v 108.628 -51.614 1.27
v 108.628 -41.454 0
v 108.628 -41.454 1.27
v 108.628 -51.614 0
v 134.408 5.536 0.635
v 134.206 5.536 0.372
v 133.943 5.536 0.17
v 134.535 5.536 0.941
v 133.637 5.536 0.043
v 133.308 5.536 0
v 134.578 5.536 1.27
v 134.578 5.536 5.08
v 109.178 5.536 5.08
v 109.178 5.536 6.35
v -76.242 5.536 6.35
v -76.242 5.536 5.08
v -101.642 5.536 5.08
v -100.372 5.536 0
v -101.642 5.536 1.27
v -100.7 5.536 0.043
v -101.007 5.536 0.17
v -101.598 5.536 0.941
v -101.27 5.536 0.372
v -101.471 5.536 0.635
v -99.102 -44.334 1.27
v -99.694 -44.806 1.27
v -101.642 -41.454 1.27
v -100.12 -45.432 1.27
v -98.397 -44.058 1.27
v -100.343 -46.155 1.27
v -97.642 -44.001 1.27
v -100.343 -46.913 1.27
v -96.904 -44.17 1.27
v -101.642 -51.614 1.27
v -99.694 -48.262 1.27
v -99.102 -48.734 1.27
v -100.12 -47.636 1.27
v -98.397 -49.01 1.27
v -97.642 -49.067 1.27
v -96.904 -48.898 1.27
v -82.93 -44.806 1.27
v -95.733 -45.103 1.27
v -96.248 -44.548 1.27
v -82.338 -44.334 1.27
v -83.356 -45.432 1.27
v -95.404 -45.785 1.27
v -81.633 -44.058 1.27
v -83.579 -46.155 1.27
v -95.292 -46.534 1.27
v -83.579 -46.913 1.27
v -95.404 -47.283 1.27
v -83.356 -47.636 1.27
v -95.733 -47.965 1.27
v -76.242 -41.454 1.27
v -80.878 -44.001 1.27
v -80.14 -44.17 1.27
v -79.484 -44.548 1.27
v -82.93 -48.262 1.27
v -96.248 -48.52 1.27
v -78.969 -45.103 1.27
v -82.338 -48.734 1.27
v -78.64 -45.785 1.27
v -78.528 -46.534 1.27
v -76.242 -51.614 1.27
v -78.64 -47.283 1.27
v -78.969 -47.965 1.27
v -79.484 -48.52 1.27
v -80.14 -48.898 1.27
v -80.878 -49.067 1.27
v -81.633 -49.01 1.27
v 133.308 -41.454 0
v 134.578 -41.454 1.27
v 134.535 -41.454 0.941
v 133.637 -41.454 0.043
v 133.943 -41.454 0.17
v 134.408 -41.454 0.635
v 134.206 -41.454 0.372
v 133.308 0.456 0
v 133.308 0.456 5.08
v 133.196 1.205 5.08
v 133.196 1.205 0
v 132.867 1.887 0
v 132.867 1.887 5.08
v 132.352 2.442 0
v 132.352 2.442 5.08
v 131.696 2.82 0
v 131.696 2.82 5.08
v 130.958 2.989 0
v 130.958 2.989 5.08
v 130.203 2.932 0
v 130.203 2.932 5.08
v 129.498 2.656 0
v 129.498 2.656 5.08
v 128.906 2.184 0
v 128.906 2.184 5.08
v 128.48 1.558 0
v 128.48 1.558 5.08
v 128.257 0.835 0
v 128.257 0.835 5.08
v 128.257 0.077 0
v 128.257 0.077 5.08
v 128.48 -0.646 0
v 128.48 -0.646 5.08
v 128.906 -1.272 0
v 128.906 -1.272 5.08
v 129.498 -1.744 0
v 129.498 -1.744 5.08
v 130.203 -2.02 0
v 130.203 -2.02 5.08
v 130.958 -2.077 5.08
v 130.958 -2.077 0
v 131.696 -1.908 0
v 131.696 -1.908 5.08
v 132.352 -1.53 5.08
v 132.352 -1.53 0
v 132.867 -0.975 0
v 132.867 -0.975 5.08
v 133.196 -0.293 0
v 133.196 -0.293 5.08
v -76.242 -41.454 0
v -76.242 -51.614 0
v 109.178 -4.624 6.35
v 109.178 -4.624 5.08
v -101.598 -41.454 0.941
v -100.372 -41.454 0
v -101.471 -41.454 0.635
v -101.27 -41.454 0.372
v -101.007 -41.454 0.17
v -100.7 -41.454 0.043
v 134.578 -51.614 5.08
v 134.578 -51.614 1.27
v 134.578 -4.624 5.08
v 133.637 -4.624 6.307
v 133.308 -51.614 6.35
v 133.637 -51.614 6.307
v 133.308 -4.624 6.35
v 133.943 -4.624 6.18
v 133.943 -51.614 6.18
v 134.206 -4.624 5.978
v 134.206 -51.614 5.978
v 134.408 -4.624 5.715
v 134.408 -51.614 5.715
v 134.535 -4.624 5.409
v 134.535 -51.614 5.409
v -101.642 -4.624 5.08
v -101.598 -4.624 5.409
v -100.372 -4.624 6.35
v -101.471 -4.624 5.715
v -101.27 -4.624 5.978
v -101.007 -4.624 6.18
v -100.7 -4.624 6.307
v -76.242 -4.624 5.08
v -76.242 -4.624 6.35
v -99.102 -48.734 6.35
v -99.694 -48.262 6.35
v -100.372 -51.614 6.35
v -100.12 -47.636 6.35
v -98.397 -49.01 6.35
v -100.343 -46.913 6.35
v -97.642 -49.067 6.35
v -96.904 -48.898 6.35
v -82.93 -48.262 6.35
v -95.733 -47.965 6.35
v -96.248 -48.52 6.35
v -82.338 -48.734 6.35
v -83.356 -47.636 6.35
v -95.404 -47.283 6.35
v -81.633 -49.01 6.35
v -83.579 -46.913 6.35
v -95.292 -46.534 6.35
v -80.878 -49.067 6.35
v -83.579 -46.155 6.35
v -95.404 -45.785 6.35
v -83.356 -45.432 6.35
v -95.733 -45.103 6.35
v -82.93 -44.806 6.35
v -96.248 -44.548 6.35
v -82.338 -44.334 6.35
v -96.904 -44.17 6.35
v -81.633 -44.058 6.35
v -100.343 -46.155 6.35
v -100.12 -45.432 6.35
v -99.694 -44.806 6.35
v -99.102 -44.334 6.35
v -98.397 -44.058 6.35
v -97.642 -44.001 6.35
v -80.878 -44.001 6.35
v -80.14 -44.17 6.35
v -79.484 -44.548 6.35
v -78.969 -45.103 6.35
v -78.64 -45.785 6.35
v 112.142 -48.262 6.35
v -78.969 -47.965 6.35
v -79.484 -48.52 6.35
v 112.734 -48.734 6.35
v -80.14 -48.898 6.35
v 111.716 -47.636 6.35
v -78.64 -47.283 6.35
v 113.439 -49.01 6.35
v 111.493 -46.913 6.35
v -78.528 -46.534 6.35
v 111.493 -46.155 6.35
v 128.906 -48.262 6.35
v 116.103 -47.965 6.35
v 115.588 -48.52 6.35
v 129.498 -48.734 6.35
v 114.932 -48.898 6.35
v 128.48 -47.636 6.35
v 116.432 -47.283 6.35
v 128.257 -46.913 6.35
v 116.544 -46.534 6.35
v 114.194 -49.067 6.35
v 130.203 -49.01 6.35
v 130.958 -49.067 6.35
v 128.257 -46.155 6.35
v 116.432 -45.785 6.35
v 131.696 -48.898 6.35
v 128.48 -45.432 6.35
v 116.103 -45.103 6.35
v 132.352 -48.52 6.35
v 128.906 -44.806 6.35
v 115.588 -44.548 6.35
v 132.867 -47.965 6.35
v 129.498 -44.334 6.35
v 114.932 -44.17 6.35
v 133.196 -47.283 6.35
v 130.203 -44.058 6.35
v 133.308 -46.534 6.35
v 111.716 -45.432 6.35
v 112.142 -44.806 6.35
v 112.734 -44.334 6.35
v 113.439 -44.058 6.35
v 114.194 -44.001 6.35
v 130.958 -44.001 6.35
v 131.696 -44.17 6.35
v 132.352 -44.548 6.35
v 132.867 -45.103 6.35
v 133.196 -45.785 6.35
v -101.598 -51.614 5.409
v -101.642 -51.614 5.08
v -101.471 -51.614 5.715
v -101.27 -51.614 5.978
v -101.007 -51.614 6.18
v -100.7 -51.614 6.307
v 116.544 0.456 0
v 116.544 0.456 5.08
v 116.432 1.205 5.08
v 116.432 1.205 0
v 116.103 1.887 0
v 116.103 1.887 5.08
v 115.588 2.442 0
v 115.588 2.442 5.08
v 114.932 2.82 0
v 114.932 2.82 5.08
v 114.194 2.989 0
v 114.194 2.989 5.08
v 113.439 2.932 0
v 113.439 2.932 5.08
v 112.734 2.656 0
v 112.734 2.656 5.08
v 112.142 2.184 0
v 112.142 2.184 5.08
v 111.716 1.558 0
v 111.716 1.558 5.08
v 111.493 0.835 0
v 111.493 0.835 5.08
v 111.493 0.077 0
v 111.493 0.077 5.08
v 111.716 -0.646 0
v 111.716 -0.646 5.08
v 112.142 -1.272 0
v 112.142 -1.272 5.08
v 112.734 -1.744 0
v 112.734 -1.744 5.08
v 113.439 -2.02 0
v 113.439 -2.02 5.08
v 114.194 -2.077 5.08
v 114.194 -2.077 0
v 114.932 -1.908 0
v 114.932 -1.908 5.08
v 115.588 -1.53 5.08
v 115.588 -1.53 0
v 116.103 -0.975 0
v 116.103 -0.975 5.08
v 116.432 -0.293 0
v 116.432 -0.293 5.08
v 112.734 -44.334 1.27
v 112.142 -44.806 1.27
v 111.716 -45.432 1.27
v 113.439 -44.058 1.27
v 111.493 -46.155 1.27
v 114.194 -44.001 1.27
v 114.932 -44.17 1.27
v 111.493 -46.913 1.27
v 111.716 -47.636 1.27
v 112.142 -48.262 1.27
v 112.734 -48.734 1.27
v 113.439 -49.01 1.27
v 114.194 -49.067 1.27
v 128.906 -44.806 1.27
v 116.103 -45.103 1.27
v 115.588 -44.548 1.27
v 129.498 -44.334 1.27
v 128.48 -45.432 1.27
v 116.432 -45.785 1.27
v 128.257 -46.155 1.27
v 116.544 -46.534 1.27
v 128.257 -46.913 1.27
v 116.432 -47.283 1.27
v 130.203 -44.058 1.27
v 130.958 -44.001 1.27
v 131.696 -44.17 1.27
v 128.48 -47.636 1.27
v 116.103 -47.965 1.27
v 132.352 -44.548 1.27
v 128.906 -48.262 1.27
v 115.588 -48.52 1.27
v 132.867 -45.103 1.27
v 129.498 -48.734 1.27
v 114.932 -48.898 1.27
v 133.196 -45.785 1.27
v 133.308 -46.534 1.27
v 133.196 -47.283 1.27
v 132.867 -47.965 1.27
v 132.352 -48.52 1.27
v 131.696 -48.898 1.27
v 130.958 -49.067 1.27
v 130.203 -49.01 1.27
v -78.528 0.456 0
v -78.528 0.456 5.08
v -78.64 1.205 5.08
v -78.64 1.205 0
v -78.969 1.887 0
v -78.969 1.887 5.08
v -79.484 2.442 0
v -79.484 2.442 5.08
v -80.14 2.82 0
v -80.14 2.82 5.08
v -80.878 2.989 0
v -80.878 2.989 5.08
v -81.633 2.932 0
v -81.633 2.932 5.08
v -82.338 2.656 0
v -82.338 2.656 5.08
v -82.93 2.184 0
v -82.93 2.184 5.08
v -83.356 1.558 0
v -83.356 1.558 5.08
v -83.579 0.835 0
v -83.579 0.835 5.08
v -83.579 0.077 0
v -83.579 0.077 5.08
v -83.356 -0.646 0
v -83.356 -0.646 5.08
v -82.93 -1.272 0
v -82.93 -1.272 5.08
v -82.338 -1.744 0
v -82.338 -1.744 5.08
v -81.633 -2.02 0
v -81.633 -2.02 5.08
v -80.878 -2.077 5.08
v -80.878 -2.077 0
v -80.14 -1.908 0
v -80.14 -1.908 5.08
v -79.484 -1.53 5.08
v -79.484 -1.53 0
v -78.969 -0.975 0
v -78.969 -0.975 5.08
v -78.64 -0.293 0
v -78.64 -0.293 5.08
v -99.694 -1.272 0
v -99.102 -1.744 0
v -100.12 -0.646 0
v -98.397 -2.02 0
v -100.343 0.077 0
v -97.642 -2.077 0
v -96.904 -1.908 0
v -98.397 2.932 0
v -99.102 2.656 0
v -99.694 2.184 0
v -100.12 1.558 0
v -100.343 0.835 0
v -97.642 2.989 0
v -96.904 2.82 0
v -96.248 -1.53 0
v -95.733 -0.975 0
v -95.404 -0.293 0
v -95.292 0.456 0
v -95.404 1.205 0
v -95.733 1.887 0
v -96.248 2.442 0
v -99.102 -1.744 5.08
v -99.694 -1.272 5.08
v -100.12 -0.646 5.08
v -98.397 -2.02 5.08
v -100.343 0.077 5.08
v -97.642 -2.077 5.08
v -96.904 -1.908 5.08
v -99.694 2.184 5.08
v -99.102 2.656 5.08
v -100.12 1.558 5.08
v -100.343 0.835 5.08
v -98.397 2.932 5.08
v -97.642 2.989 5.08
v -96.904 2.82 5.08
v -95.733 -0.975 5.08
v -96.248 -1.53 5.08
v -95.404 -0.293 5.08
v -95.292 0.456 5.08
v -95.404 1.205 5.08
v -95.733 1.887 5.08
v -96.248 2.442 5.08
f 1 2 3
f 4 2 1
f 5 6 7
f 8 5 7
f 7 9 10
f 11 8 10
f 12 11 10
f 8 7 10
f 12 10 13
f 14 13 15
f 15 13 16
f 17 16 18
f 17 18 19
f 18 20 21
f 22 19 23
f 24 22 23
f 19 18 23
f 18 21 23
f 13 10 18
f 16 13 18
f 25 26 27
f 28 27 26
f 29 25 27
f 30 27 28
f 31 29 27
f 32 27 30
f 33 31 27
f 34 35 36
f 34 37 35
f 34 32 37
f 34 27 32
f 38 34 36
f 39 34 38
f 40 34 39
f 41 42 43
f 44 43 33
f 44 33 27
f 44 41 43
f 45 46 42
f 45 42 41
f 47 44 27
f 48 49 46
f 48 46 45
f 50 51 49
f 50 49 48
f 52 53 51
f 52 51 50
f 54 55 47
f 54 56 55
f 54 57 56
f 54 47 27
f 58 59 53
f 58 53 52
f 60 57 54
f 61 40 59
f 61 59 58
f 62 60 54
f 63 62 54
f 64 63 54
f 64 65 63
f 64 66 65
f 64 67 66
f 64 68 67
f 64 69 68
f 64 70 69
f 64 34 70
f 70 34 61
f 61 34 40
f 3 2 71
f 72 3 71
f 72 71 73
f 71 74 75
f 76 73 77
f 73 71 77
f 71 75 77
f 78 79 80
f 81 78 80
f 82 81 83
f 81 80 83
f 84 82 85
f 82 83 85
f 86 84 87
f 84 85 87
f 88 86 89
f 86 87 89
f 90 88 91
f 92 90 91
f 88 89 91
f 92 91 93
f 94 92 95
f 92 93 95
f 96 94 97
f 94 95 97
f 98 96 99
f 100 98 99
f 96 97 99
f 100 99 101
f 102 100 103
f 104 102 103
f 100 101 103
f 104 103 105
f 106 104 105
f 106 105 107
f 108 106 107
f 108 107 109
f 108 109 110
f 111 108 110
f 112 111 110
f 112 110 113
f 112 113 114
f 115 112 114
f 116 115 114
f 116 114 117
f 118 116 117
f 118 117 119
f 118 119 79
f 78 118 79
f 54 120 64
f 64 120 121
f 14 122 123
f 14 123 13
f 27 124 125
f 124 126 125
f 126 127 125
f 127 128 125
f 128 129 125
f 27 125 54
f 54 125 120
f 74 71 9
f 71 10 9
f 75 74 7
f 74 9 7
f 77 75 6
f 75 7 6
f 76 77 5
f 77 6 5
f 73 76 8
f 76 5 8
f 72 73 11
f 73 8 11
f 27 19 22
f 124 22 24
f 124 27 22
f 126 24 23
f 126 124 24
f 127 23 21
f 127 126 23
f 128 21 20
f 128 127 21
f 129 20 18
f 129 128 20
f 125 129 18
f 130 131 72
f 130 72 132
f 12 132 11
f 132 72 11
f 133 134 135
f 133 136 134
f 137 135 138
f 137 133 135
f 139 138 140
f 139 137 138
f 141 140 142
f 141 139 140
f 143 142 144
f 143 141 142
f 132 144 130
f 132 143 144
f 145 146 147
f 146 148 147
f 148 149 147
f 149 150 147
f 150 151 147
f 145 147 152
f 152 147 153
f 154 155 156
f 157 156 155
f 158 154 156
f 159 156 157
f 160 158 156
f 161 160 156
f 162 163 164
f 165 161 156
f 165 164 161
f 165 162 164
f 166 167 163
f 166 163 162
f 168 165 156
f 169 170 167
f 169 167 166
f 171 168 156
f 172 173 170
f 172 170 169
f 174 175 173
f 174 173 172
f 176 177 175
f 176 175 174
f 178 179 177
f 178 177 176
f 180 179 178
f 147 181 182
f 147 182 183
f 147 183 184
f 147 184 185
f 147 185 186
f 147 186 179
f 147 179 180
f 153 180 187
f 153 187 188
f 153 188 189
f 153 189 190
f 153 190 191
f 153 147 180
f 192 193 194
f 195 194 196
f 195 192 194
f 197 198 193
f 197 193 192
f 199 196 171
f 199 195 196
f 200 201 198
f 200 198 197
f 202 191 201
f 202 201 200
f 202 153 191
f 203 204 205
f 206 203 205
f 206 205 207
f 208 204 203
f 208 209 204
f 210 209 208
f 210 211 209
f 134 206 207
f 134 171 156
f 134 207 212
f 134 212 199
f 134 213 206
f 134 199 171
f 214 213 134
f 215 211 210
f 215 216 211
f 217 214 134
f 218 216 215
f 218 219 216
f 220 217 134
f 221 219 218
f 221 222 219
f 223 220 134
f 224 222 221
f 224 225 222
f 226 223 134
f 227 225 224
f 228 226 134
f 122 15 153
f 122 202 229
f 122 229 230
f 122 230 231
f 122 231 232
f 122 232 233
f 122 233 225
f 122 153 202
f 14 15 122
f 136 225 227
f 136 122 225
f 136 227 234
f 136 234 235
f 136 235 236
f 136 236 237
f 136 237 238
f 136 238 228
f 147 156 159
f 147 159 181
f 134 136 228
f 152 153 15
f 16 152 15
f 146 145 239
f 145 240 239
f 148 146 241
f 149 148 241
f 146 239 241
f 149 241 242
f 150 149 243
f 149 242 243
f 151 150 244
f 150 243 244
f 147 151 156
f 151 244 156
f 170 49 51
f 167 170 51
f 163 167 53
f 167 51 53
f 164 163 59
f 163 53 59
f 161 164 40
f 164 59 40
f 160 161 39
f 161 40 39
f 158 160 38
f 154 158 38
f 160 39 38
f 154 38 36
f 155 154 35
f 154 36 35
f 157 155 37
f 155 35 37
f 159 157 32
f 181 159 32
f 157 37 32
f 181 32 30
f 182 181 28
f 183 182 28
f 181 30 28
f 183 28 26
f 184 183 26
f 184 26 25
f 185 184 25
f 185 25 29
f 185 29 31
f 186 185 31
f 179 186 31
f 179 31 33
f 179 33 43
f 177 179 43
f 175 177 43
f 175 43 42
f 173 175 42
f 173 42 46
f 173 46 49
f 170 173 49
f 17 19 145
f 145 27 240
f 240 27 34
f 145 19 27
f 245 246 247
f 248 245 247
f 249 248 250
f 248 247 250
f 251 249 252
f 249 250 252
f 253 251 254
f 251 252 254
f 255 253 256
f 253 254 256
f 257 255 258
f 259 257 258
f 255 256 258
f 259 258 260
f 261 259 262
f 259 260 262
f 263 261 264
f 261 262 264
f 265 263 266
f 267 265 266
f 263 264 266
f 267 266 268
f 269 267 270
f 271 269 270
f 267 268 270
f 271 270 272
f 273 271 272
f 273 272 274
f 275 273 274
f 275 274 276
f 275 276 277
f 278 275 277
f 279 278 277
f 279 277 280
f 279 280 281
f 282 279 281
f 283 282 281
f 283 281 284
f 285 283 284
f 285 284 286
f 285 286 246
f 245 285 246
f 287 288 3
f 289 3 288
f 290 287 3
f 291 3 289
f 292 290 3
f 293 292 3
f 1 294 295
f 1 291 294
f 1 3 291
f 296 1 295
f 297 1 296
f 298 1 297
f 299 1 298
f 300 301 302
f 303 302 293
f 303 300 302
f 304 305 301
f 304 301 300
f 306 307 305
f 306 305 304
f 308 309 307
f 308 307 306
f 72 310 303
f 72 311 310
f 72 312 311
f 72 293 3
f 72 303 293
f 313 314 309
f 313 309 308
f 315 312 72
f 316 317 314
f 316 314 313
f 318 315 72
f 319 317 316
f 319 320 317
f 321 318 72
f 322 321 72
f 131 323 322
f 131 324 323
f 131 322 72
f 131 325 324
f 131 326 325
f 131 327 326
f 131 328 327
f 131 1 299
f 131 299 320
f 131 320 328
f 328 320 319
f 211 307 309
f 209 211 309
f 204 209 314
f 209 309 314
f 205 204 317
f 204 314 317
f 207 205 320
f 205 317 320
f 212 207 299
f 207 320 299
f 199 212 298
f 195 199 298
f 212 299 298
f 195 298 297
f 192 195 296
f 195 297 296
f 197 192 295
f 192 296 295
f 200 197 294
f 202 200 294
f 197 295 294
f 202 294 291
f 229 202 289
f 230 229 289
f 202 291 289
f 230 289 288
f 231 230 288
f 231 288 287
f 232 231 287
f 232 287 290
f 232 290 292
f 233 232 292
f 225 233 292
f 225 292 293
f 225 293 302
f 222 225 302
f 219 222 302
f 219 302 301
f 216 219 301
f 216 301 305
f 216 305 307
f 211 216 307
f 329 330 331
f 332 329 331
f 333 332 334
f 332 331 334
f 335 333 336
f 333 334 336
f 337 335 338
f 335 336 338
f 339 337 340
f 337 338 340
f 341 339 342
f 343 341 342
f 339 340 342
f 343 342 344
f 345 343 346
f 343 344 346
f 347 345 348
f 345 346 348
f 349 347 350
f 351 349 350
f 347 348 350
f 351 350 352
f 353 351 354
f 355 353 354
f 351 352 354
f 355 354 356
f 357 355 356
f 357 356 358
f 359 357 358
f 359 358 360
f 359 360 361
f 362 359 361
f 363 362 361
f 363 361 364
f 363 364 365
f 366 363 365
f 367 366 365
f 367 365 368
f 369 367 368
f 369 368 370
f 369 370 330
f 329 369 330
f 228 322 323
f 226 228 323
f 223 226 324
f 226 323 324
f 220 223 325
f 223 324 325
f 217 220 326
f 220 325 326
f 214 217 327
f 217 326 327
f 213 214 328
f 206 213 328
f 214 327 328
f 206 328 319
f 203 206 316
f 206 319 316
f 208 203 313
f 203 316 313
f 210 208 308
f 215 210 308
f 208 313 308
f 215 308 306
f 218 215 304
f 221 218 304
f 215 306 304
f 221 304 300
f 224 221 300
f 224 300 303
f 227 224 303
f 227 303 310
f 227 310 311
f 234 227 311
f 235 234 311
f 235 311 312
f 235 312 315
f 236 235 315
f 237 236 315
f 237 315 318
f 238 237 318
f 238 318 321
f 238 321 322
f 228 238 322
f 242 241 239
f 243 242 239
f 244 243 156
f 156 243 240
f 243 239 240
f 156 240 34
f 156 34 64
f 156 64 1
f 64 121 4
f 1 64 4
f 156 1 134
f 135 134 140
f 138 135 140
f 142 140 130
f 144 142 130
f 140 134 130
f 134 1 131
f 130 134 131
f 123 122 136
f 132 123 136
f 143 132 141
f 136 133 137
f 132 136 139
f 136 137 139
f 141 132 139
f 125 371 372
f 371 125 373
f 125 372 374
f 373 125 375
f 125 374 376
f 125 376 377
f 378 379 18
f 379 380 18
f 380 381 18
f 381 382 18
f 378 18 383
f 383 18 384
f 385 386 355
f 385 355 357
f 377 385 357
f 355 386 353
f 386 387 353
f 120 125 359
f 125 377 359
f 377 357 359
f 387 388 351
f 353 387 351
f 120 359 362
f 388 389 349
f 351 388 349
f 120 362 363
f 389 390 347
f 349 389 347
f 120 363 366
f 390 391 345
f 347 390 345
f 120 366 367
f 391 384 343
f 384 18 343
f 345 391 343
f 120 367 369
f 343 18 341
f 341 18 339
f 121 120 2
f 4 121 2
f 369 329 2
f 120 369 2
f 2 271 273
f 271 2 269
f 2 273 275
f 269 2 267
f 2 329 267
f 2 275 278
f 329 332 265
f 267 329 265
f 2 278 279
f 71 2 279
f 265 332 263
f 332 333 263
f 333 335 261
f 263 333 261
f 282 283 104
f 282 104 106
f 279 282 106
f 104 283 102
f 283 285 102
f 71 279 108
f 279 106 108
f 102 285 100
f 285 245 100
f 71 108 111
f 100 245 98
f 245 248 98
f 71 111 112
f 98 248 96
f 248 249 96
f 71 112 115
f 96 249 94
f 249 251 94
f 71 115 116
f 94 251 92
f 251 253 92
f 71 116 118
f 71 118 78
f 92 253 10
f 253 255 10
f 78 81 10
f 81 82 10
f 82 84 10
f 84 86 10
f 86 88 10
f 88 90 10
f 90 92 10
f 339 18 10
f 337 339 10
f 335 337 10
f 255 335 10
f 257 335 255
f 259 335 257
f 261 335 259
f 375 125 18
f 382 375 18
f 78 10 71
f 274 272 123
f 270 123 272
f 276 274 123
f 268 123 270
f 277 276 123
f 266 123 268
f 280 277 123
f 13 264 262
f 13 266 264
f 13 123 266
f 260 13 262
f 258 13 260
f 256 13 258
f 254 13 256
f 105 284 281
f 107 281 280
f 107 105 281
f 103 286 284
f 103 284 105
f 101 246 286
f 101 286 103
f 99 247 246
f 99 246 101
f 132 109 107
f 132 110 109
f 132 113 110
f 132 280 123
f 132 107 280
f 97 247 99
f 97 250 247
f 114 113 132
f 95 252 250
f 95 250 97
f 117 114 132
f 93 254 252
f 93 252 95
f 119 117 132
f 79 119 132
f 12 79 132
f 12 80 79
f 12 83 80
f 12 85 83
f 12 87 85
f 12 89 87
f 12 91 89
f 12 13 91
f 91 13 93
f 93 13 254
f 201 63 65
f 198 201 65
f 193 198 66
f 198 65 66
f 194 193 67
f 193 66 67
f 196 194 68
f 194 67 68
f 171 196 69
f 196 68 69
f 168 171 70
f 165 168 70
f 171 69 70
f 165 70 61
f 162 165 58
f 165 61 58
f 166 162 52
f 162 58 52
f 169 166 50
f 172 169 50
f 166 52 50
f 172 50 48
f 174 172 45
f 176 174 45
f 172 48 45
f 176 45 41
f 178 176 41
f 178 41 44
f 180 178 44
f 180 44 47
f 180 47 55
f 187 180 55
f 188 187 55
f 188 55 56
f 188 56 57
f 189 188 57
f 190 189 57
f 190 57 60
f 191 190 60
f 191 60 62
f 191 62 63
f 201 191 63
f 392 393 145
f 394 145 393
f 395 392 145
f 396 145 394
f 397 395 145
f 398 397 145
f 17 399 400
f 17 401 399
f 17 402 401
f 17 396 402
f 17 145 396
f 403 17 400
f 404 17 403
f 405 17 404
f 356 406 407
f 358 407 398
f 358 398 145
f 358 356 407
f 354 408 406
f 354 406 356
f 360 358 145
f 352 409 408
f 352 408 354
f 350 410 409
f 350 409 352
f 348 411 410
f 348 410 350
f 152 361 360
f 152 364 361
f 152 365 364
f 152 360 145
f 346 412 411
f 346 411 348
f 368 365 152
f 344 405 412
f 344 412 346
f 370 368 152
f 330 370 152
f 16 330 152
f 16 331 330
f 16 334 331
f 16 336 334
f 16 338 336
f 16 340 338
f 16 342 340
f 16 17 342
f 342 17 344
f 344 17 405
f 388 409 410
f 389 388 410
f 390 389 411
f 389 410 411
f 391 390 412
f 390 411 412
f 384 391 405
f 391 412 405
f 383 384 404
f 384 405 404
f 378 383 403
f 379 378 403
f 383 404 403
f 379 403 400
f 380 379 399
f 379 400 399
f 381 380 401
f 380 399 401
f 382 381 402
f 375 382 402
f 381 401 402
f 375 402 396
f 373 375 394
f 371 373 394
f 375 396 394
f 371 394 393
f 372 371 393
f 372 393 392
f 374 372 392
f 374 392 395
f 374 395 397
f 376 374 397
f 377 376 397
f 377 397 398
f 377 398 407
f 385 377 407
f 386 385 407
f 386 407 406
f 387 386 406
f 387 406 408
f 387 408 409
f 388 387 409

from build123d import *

# Parameters (mm, degrees)
F1_DEPTH  = 6.35
F2_W      = 25.4
F2_H      = 10.16
F3_DEPTH  = 1.27
F4_R      = 2.54
F5_DEPTH  = 25.4
F6_R      = 2.54
F7_DEPTH  = 25.4
F8_W      = 25.4
F8_H      = 10.16
F8_W_2    = 25.950329153
F9_DEPTH  = 1.27
F10_R     = 2.54
F11_DEPTH = 25.4
F12_R     = 2.54
F13_DEPTH = 25.4
F14_R     = 1.26999


# Not quite as in the source:
# - a fillet or chamfer is up to 0.001 mm smaller than in the source, because OpenCascade refuses the exact size


with BuildPart() as f1:
    # F0 (on Top) → F1 (new body)
    with BuildSketch(Plane.XY):
        Polygon((-53.3815915518, 5.5359576059), (-101.6415915518, 5.5359576059), (-101.6415915518, -51.6140423941), (-53.3815915518, -51.6140423941), (86.3184084482, -51.6140423941), (134.5784084482, -51.6140423941), (134.5784084482, 5.5359576059), (86.3184084482, 5.5359576059), align=None)
    extrude(amount=F1_DEPTH)

    # F2 (on face) → F3 (cut)
    with BuildSketch(Plane.XY.offset(6.35)):
        with Locations((-88.9415915518, 0.4559576059)):
            Rectangle(F2_W, F2_H)
        with Locations((121.8784084482, 0.4559576059)):
            Rectangle(F2_W, F2_H)
    extrude(amount=-F3_DEPTH, mode=Mode.SUBTRACT)

    # F4 (on face) → F5 (cut)
    with BuildSketch(Plane.XY.offset(5.08)):
        with Locations((-97.8315915518, 0.4559576059)):
            Circle(F4_R)
        with Locations((-81.0675915518, 0.4559576059)):
            Circle(F4_R)
    extrude(amount=-F5_DEPTH, mode=Mode.SUBTRACT)

    # F6 (on face) → F7 (cut)
    with BuildSketch(Plane.XY.offset(5.08)):
        with Locations((130.7684084482, 0.4559576059)):
            Circle(F6_R)
        with Locations((114.0044084482, 0.4559576059)):
            Circle(F6_R)
    extrude(amount=-F7_DEPTH, mode=Mode.SUBTRACT)

    # F8 (on face) → F9 (cut)
    with BuildSketch(Plane(origin=(0, 0, 0), x_dir=(1, 0, 0), z_dir=(0, 0, -1))):
        with Locations((-88.9415915518, 46.5340423941)):
            Rectangle(F8_W, F8_H)
        with Locations((121.6032438717, 46.5340423941)):
            Rectangle(F8_W_2, F8_H)
    extrude(amount=-F9_DEPTH, mode=Mode.SUBTRACT)

    # F10 (on face) → F11 (cut)
    with BuildSketch(Plane(origin=(0, 0, 1.27), x_dir=(1, 0, 0), z_dir=(0, 0, -1))):
        with Locations((-97.8315915518, 46.5340423941)):
            Circle(F10_R)
        with Locations((-81.0675915518, 46.5340423941)):
            Circle(F10_R)
    extrude(amount=-F11_DEPTH, mode=Mode.SUBTRACT)

    # F12 (on face) → F13 (cut)
    with BuildSketch(Plane(origin=(0, 0, 1.27), x_dir=(1, 0, 0), z_dir=(0, 0, -1))):
        with Locations((114.0044084482, 46.5340423941)):
            Circle(F12_R)
        with Locations((130.7684084482, 46.5340423941)):
            Circle(F12_R)
    extrude(amount=-F13_DEPTH, mode=Mode.SUBTRACT)

    # F14 (radius 1.27 in the source; OpenCascade refuses exactly that, so slightly less here)
    f14_edges = [f1.edges().sort_by_distance(p)[0] for p in [
        (134.578408, -28.119042, 6.35),
        (134.578408, -17.959042, 0),
        (-101.641592, -28.119042, 6.35),
        (-101.641592, -17.959042, 0),
    ]]
    fillet(f14_edges, radius=F14_R)


solid = f1.part
